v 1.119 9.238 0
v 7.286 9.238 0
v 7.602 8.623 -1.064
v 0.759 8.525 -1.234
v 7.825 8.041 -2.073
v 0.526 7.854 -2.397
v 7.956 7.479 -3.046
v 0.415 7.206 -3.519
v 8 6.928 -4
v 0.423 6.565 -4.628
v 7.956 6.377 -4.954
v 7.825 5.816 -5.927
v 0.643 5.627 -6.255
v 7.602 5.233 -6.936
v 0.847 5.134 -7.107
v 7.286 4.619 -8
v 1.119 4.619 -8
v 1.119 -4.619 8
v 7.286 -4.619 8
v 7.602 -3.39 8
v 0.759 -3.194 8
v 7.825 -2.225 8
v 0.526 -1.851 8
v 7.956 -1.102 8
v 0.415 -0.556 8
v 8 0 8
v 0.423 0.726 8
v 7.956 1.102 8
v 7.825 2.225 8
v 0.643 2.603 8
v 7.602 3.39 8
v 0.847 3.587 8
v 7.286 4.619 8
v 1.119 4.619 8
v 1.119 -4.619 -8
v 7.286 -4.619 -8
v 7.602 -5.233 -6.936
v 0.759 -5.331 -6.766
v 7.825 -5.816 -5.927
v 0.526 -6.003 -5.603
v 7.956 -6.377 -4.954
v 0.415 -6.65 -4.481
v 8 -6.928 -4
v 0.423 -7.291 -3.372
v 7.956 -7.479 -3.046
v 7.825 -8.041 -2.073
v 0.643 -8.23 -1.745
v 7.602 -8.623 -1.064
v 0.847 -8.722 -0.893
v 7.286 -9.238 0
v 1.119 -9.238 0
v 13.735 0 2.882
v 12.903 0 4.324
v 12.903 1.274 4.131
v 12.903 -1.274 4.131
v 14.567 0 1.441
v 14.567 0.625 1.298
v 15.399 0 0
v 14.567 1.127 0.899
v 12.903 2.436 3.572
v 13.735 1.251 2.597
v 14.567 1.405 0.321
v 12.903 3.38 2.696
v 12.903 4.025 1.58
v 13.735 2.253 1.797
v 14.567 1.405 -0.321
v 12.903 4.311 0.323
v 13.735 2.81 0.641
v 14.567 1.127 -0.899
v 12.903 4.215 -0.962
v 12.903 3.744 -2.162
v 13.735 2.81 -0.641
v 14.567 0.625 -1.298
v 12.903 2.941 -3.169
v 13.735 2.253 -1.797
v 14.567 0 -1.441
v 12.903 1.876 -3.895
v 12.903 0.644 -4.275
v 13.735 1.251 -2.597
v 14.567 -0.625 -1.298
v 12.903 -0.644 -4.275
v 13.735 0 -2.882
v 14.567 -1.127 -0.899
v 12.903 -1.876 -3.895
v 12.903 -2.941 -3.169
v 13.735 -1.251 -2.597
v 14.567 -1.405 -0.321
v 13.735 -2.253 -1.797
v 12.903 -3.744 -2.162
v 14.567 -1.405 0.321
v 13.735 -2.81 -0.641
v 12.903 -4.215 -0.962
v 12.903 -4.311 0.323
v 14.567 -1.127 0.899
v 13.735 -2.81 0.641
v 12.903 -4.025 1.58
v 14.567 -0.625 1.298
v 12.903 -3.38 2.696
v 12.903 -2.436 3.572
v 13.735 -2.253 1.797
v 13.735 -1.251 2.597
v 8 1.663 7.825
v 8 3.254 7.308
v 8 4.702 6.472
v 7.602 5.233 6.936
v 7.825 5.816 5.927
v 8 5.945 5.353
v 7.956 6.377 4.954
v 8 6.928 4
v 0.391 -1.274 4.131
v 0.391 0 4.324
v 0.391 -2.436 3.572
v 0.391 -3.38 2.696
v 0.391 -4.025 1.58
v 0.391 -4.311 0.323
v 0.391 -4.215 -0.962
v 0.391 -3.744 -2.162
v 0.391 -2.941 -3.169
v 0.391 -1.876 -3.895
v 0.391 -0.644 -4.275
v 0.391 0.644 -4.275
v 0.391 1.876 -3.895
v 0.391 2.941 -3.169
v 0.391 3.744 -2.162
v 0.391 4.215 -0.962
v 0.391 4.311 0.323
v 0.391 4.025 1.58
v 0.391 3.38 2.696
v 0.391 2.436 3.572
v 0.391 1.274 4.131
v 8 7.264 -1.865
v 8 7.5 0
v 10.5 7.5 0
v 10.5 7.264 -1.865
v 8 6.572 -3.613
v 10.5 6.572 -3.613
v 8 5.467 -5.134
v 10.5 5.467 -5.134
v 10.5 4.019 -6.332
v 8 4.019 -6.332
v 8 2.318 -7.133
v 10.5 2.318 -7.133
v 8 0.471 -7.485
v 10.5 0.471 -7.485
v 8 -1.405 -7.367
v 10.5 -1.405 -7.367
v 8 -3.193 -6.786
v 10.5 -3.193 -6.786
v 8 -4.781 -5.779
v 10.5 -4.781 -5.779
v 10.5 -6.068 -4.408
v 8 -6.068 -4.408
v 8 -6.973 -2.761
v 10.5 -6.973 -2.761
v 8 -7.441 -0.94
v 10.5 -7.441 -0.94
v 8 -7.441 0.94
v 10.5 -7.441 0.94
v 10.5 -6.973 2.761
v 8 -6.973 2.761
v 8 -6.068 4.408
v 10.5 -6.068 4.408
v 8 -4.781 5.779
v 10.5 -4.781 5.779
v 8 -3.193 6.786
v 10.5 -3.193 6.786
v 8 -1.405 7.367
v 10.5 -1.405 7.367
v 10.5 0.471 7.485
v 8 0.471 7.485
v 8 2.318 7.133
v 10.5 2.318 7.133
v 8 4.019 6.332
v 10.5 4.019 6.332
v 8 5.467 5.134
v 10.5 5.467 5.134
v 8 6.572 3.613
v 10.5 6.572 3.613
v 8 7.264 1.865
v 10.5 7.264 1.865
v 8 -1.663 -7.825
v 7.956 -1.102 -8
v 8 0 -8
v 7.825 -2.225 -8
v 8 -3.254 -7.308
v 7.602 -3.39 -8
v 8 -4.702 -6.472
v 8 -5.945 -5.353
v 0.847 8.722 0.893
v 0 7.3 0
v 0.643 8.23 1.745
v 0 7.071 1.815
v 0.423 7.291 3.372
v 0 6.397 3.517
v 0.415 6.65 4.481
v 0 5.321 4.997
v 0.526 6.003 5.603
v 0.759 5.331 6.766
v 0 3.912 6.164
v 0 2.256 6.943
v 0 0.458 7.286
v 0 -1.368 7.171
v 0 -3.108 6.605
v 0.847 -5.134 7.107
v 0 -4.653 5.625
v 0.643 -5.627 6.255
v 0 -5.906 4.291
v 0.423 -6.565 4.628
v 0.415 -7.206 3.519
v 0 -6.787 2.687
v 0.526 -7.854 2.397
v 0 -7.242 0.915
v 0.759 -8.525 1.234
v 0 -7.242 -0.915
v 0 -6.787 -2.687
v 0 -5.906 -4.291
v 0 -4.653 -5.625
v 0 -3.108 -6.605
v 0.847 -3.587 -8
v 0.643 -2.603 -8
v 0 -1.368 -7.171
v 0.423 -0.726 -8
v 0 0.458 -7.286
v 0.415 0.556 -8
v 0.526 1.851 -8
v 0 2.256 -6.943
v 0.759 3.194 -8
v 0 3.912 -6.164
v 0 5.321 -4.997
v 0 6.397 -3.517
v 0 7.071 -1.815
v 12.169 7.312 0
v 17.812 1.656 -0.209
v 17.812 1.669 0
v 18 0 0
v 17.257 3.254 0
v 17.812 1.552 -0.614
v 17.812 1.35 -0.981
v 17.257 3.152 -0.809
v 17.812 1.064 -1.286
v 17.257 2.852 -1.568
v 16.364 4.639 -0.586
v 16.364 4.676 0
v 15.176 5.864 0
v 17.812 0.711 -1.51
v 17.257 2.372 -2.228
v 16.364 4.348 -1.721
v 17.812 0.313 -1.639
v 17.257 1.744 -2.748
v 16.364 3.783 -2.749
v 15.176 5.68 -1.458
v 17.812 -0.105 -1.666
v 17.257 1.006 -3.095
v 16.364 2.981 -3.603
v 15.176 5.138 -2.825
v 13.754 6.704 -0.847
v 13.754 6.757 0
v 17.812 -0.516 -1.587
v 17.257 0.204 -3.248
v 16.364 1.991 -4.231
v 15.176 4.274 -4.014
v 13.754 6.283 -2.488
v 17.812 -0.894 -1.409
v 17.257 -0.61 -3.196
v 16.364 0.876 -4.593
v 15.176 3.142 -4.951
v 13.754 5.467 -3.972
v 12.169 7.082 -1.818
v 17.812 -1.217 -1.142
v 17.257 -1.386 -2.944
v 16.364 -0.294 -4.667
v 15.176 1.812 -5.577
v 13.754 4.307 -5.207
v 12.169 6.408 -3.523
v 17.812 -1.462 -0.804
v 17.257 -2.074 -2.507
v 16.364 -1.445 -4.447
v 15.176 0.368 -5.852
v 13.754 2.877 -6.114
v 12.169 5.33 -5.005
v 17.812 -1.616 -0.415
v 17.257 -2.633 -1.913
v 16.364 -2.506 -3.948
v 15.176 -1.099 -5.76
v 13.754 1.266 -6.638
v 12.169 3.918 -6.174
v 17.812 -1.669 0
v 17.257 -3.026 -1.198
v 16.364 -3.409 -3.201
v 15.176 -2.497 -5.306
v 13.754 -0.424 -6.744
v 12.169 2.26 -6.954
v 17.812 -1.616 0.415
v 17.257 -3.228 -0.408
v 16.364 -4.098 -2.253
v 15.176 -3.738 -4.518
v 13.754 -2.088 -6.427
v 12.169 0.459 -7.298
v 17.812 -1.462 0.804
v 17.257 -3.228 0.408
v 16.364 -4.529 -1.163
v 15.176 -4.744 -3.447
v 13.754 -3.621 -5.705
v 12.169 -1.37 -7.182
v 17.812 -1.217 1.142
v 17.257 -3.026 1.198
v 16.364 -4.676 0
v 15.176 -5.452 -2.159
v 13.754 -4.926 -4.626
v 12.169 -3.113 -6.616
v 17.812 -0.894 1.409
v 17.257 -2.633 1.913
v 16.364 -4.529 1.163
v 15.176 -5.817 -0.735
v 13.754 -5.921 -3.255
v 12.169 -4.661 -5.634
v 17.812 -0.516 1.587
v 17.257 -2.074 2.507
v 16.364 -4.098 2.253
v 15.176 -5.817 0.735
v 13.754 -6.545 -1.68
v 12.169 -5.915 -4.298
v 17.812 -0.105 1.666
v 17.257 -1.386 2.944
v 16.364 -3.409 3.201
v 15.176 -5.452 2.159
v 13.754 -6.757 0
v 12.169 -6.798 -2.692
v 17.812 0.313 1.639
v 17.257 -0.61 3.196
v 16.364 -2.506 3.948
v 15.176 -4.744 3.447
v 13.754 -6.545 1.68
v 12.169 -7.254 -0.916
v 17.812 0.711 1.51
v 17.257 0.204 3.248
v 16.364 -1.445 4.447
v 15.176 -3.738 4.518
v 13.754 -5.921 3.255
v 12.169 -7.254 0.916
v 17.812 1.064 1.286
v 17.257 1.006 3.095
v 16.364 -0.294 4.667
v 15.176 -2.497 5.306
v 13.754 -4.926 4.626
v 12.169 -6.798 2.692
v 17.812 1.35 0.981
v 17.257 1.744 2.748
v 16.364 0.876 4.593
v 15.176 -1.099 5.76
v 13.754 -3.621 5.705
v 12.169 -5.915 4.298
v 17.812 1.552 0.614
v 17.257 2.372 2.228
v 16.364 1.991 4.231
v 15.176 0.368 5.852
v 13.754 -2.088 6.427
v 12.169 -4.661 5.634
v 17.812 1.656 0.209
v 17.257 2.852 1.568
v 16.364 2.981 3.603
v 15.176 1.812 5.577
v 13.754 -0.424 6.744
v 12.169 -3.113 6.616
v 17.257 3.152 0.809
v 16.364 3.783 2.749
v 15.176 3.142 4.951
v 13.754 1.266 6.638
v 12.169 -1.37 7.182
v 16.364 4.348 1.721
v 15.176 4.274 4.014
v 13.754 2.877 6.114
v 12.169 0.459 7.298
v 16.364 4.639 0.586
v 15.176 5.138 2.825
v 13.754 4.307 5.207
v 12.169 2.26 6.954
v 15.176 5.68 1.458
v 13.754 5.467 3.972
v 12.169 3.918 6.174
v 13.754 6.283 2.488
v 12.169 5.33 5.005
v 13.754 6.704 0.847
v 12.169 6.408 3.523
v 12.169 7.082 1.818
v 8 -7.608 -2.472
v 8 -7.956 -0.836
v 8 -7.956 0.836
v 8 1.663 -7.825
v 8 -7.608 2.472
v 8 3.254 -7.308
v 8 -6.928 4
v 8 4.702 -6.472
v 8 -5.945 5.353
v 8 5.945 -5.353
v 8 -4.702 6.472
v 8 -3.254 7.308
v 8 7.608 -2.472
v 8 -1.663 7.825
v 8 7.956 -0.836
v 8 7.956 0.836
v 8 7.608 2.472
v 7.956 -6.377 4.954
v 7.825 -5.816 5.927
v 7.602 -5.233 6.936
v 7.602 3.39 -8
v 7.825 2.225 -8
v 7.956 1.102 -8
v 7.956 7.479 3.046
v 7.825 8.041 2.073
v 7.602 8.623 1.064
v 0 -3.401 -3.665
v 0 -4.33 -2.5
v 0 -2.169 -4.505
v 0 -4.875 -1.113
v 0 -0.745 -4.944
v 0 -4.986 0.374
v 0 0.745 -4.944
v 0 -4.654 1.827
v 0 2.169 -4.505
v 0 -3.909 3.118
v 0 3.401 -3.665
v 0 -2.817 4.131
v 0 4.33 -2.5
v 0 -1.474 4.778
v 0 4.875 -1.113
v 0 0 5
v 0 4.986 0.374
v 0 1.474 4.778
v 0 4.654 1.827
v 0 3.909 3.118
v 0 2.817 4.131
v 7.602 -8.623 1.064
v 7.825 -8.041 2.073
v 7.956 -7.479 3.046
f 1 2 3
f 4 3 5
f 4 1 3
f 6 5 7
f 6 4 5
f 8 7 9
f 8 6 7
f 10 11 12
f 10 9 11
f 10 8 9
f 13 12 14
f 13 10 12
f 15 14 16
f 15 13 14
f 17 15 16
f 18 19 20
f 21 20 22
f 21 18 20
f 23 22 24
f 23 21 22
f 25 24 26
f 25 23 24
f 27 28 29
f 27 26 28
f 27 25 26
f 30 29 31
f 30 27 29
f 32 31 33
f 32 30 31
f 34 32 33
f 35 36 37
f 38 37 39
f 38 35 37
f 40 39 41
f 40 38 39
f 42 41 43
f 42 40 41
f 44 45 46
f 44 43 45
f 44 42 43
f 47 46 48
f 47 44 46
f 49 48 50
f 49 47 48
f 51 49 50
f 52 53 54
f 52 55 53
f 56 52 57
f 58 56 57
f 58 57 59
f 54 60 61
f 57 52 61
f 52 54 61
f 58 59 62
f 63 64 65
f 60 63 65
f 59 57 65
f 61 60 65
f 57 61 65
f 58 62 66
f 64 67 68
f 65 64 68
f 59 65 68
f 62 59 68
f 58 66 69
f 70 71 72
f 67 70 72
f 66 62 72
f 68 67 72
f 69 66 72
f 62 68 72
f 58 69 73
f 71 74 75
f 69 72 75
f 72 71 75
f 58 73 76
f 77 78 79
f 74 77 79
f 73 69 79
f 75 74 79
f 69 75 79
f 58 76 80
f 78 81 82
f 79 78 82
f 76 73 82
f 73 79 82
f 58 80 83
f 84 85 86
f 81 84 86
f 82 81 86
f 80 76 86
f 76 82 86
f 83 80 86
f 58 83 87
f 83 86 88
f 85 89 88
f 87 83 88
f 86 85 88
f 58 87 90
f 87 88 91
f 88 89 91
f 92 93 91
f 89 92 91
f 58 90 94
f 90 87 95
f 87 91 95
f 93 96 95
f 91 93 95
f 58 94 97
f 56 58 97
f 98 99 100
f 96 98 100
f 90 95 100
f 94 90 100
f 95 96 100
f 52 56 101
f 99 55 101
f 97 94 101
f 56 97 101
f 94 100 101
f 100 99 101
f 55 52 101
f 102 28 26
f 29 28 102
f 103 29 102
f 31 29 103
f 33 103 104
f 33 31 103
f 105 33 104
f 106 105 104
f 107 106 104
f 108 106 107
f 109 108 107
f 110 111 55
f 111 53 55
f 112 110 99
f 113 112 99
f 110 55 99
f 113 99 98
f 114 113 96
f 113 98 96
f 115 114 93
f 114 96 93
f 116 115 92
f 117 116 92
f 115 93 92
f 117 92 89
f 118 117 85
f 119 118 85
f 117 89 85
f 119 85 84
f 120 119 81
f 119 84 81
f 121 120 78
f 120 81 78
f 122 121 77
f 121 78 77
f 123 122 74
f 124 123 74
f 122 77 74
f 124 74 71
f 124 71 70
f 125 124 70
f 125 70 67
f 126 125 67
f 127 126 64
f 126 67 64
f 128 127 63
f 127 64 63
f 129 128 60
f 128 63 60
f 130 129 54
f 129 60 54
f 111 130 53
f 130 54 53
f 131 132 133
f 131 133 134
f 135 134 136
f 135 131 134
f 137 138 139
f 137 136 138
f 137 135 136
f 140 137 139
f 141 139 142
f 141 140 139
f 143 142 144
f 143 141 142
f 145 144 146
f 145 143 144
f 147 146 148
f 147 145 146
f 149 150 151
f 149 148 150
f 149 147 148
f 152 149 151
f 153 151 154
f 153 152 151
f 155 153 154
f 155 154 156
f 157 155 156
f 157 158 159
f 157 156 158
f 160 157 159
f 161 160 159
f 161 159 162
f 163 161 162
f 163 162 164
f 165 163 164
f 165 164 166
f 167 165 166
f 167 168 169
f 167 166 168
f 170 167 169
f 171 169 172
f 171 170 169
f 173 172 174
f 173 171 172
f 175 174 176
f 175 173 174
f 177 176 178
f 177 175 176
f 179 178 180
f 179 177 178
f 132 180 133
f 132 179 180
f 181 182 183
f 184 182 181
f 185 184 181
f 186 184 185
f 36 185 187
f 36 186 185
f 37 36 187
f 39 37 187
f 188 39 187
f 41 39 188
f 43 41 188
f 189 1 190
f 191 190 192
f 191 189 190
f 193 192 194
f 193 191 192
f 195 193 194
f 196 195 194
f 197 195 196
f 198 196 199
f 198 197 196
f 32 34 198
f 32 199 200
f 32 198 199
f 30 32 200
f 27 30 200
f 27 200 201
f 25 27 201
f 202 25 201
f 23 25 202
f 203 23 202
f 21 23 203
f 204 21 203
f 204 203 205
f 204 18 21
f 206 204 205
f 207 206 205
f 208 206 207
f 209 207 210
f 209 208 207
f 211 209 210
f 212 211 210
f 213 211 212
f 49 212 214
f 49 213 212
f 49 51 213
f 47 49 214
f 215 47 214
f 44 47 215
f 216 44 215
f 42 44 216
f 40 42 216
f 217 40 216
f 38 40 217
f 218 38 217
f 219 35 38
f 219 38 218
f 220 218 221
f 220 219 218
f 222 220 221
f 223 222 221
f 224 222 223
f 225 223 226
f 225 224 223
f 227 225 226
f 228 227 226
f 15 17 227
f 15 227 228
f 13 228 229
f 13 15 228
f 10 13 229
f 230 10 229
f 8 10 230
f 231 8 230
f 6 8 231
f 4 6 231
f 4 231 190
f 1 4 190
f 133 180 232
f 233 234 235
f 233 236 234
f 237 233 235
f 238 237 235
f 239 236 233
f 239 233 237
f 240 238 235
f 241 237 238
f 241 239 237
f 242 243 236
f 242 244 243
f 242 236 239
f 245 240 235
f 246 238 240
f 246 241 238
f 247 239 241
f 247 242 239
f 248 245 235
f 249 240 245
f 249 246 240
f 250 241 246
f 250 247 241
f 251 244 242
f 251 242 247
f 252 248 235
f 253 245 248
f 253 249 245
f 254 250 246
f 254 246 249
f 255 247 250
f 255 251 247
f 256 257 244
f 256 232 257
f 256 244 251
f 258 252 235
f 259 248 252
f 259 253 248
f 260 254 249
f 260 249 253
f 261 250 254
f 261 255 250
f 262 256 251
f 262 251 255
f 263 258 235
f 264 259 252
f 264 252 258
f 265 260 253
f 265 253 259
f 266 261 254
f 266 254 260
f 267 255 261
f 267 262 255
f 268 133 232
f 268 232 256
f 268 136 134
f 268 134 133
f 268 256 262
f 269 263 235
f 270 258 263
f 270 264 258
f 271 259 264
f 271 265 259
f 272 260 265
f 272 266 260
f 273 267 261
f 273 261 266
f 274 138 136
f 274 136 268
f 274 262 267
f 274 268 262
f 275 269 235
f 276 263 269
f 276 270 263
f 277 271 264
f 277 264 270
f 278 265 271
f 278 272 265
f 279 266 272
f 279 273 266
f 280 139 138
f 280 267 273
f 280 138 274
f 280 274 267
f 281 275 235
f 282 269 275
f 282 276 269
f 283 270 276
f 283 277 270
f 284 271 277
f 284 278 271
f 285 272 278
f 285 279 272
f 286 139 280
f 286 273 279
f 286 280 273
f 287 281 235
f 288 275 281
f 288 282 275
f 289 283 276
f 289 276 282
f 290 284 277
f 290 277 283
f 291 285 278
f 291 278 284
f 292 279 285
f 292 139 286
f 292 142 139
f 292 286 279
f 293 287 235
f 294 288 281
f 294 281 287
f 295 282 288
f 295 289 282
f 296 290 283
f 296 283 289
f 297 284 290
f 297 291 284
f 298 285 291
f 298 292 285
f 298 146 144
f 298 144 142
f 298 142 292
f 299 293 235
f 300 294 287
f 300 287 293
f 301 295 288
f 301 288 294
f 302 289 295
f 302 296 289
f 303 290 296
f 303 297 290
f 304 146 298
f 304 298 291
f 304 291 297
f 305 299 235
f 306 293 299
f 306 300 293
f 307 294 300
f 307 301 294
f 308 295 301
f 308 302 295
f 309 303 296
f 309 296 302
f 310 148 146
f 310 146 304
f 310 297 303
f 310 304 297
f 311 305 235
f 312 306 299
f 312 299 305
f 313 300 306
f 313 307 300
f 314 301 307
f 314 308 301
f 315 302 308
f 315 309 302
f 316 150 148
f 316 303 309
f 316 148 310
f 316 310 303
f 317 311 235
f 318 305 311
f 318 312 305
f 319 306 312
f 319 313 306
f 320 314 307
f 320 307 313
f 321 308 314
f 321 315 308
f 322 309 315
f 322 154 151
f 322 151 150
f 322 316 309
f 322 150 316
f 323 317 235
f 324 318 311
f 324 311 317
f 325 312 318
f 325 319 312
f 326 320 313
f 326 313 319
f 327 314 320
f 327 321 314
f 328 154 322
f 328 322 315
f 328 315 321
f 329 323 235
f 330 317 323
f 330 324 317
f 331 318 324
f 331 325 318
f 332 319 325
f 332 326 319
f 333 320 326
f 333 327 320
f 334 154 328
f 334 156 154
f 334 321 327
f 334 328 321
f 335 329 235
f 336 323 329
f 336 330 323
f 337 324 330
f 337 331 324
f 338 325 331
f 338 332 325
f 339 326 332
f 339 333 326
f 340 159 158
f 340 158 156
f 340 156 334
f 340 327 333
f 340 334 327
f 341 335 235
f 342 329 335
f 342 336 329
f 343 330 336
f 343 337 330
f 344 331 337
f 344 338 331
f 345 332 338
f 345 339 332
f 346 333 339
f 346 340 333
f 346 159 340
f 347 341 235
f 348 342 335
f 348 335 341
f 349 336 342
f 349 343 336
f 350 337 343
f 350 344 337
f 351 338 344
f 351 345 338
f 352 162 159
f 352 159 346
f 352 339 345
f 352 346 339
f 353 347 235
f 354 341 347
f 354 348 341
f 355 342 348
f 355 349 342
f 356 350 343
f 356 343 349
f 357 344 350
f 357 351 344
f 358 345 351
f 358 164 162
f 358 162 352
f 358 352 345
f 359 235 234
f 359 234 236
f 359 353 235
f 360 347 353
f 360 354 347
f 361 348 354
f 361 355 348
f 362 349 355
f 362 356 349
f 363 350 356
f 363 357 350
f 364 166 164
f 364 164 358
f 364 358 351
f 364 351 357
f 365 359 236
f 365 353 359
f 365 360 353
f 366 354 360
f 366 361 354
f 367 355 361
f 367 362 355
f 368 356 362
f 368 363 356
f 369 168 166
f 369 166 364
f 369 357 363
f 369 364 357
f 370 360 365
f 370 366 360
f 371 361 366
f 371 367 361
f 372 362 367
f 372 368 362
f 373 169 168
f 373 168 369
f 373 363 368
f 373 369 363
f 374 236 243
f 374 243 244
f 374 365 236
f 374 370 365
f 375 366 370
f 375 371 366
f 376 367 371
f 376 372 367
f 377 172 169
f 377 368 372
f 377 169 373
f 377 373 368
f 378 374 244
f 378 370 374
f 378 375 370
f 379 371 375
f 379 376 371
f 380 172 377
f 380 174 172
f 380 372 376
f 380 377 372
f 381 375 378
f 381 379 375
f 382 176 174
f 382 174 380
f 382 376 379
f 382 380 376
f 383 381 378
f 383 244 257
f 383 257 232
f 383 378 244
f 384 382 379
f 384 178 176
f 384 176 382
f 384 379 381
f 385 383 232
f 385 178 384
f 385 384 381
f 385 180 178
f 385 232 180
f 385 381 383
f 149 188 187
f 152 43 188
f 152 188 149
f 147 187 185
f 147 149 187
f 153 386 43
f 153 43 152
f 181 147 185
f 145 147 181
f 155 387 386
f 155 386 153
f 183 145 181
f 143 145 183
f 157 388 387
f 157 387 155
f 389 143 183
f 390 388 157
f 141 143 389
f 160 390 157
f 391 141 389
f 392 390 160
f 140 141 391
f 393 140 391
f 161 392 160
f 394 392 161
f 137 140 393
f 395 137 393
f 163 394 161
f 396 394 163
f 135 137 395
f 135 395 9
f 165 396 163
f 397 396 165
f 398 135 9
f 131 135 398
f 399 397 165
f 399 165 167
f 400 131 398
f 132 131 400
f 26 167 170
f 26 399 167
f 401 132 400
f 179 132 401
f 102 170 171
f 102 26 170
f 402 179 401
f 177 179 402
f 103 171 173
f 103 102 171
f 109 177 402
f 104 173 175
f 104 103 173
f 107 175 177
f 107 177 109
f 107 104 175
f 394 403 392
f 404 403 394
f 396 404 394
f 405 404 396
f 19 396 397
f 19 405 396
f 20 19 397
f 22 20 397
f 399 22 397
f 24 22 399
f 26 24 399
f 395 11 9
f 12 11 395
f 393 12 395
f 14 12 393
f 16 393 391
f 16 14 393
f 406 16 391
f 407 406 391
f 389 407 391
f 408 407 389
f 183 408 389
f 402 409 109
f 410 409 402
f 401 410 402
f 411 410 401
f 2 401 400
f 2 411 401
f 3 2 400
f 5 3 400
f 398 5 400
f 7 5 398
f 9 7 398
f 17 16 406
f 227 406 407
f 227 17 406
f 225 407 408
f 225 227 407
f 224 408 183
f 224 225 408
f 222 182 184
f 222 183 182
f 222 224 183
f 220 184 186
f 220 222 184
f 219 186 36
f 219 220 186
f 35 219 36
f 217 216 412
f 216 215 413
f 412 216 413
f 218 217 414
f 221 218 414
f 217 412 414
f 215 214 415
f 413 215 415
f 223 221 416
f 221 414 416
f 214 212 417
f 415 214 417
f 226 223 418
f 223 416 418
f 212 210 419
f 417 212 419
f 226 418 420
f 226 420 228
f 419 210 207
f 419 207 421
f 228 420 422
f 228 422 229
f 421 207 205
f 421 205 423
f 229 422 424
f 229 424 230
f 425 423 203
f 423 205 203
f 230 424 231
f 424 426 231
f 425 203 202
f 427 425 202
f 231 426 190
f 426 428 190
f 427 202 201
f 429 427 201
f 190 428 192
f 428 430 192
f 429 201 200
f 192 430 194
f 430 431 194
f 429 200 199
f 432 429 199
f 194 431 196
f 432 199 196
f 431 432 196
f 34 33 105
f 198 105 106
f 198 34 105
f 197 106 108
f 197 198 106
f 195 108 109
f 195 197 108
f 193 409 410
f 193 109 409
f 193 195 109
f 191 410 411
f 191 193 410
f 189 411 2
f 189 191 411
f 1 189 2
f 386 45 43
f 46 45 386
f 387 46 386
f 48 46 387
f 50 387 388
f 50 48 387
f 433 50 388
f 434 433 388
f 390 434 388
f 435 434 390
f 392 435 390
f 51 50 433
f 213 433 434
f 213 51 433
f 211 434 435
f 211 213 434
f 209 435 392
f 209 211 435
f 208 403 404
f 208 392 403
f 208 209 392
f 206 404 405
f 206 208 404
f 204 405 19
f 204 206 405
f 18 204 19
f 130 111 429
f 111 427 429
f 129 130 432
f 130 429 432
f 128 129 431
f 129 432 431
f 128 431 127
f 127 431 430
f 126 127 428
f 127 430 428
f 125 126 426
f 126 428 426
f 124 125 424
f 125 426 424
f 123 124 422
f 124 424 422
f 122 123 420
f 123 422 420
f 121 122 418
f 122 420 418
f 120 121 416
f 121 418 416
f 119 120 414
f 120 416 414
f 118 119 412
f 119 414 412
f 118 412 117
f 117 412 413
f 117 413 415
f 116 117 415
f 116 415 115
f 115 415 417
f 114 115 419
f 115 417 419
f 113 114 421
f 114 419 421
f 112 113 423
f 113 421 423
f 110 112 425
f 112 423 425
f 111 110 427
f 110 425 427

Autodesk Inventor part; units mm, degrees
ref_plane "YZ Plane" through (0, 0, 0) normal (1, 0, 0) x (0, 1, 0)
ref_plane "XZ Plane" through (0, 0, 0) normal (0, 1, 0) x (-1, 0, 0)
sketch "Skizze1" plane through (0, 0, 0) normal (1, 0, 0) x (0, 1, 0)
  line L0 (-4.6188, -8) -> (-9.2376, 0)
  line L1 (-9.2376, 0) -> (-4.6188, 8)
  line L2 (-4.6188, 8) -> (4.6188, 8)
  line L3 (4.6188, 8) -> (9.2376, 0)
  line L4 (9.2376, 0) -> (4.6188, -8)
  line L5 (4.6188, -8) -> (-4.6188, -8)
  point P0 (0, 0)
  point P1 (0, 0)
  dimension "d0" = 18.4752
extrude "Körper" add sketch "Skizze1" along normal blind 8
sketch "Skizze2" plane through (0, 0, 0) normal (0, 0, 1) x (1, 0, 0)
  line L0 (8, 0) -> (18, 0)
  arc A0 (18, 0) -> (10.5, 7.5) centre (10.5, 0) ccw
  line L1 (10.5, 7.5) -> (8, 7.5)
  line L2 (8, -4.6188) -> (8, 4.6188) projected
  line L3 (8, 0) -> (8, 7.5)
  line L4 (5.6893, 0) -> (21.864, 0) projected
  dimension "d8" = 7.5
  dimension "d9" = 10
revolve "Kopf" add sketch "Skizze2" angle 360 about axis through (8, 0, 0) along (1, 0, 0)
sketch "Skizze3" plane through (0, 0, 0) normal (-1, 0, 0) x (0, 0, 1)
  line L0 (0, -12.9326) -> (0, 12.9326) projected
  line L1 (-11.2, 0) -> (11.2, 0) projected
  point P0 (0, 0)
hole "Gewinde" at (0, 0, 0) direction (1, 0, 0) diameter 8.647 depth 12.903 tip angle 120 thread size "M10x1.25" class "6H" standard "ISO Metric profile"
sketch "Skizze4" plane through (0, 0, 0) normal (0, 0, 1) x (1, 0, 0)
  line L0 (0, 4.6188) -> (0, 9.2376) projected
  line L1 (0, 9.2376) -> (8, 9.2376) projected
  line L2 (8, 4.6188) -> (8, 9.2376) projected
  line L3 (-1.6, 0) -> (9.6, 0) projected
  line L4 (1.1187, 9.2376) -> (0, 7.3)
  line L5 (7.2855, 9.2376) -> (8, 8)
  dimension "d3" = 14.6
  dimension "d4" = 30
  dimension "d5" = 16
  dimension "d6" = 30
revolve "Fase1" cut sketch "Skizze4" angle 360 about axis through (-10, 0, 0) along (1, 0, 0)
chamfer "Fase2" distance 0.6766 angle 30 1 edges at (0, 0, -4.3235) measured on face at (0, 6.2266, -0.756)
ref_plane "Work Plane1" through (6.4515, 0, 0) normal (0, 0.866, -0.5) x (-1, 0, 0)
equation "\"d0\" = 1.1547 * SW"
equation "\"d1\" = SIH"
equation "\"d8\" = KR"
equation "\"d9\" = KOH1 - SIH"
equation "\"d11\" = GEL"
equation "\"d12\" = 1.02 * GEL"
equation "\"d3\" = SW0"
equation "\"d4\" = ANG1"
equation "\"d5\" = SW01"
equation "\"d6\" = ANG2"
equation "\"d14\" = -0.5 * GD1 + 0.5 * NND"
equation "\"d36\" = -0.5 * GD1 + 0.5 * NND"
equation "\"ANG1\" = 30deg"
equation "\"ANG2\" = 30deg"
equation "\"SIH\" = 8"
equation "\"KOH1\" = 18"
equation "\"GEL\" = 12.65"
equation "\"SW\" = 16"
equation "\"KR\" = 7.5"
equation "\"SW0\" = 14.6"
equation "\"SW01\" = SW"
equation "\"GUL\" = 0.541266 * PTC"
equation "\"TOA\" = 30deg"
equation "\"PTC\" = 1.25"
equation "\"E0\" = 1.155 * SW"
equation "\"GAL\" = 0.541266 * PTC"
equation "\"GD1\" = 8.646835"
equation "\"NND\" = 10"
properties part number "DIN 1587 - M10 x 1,25 - SW16" material "Stahl, weich"
